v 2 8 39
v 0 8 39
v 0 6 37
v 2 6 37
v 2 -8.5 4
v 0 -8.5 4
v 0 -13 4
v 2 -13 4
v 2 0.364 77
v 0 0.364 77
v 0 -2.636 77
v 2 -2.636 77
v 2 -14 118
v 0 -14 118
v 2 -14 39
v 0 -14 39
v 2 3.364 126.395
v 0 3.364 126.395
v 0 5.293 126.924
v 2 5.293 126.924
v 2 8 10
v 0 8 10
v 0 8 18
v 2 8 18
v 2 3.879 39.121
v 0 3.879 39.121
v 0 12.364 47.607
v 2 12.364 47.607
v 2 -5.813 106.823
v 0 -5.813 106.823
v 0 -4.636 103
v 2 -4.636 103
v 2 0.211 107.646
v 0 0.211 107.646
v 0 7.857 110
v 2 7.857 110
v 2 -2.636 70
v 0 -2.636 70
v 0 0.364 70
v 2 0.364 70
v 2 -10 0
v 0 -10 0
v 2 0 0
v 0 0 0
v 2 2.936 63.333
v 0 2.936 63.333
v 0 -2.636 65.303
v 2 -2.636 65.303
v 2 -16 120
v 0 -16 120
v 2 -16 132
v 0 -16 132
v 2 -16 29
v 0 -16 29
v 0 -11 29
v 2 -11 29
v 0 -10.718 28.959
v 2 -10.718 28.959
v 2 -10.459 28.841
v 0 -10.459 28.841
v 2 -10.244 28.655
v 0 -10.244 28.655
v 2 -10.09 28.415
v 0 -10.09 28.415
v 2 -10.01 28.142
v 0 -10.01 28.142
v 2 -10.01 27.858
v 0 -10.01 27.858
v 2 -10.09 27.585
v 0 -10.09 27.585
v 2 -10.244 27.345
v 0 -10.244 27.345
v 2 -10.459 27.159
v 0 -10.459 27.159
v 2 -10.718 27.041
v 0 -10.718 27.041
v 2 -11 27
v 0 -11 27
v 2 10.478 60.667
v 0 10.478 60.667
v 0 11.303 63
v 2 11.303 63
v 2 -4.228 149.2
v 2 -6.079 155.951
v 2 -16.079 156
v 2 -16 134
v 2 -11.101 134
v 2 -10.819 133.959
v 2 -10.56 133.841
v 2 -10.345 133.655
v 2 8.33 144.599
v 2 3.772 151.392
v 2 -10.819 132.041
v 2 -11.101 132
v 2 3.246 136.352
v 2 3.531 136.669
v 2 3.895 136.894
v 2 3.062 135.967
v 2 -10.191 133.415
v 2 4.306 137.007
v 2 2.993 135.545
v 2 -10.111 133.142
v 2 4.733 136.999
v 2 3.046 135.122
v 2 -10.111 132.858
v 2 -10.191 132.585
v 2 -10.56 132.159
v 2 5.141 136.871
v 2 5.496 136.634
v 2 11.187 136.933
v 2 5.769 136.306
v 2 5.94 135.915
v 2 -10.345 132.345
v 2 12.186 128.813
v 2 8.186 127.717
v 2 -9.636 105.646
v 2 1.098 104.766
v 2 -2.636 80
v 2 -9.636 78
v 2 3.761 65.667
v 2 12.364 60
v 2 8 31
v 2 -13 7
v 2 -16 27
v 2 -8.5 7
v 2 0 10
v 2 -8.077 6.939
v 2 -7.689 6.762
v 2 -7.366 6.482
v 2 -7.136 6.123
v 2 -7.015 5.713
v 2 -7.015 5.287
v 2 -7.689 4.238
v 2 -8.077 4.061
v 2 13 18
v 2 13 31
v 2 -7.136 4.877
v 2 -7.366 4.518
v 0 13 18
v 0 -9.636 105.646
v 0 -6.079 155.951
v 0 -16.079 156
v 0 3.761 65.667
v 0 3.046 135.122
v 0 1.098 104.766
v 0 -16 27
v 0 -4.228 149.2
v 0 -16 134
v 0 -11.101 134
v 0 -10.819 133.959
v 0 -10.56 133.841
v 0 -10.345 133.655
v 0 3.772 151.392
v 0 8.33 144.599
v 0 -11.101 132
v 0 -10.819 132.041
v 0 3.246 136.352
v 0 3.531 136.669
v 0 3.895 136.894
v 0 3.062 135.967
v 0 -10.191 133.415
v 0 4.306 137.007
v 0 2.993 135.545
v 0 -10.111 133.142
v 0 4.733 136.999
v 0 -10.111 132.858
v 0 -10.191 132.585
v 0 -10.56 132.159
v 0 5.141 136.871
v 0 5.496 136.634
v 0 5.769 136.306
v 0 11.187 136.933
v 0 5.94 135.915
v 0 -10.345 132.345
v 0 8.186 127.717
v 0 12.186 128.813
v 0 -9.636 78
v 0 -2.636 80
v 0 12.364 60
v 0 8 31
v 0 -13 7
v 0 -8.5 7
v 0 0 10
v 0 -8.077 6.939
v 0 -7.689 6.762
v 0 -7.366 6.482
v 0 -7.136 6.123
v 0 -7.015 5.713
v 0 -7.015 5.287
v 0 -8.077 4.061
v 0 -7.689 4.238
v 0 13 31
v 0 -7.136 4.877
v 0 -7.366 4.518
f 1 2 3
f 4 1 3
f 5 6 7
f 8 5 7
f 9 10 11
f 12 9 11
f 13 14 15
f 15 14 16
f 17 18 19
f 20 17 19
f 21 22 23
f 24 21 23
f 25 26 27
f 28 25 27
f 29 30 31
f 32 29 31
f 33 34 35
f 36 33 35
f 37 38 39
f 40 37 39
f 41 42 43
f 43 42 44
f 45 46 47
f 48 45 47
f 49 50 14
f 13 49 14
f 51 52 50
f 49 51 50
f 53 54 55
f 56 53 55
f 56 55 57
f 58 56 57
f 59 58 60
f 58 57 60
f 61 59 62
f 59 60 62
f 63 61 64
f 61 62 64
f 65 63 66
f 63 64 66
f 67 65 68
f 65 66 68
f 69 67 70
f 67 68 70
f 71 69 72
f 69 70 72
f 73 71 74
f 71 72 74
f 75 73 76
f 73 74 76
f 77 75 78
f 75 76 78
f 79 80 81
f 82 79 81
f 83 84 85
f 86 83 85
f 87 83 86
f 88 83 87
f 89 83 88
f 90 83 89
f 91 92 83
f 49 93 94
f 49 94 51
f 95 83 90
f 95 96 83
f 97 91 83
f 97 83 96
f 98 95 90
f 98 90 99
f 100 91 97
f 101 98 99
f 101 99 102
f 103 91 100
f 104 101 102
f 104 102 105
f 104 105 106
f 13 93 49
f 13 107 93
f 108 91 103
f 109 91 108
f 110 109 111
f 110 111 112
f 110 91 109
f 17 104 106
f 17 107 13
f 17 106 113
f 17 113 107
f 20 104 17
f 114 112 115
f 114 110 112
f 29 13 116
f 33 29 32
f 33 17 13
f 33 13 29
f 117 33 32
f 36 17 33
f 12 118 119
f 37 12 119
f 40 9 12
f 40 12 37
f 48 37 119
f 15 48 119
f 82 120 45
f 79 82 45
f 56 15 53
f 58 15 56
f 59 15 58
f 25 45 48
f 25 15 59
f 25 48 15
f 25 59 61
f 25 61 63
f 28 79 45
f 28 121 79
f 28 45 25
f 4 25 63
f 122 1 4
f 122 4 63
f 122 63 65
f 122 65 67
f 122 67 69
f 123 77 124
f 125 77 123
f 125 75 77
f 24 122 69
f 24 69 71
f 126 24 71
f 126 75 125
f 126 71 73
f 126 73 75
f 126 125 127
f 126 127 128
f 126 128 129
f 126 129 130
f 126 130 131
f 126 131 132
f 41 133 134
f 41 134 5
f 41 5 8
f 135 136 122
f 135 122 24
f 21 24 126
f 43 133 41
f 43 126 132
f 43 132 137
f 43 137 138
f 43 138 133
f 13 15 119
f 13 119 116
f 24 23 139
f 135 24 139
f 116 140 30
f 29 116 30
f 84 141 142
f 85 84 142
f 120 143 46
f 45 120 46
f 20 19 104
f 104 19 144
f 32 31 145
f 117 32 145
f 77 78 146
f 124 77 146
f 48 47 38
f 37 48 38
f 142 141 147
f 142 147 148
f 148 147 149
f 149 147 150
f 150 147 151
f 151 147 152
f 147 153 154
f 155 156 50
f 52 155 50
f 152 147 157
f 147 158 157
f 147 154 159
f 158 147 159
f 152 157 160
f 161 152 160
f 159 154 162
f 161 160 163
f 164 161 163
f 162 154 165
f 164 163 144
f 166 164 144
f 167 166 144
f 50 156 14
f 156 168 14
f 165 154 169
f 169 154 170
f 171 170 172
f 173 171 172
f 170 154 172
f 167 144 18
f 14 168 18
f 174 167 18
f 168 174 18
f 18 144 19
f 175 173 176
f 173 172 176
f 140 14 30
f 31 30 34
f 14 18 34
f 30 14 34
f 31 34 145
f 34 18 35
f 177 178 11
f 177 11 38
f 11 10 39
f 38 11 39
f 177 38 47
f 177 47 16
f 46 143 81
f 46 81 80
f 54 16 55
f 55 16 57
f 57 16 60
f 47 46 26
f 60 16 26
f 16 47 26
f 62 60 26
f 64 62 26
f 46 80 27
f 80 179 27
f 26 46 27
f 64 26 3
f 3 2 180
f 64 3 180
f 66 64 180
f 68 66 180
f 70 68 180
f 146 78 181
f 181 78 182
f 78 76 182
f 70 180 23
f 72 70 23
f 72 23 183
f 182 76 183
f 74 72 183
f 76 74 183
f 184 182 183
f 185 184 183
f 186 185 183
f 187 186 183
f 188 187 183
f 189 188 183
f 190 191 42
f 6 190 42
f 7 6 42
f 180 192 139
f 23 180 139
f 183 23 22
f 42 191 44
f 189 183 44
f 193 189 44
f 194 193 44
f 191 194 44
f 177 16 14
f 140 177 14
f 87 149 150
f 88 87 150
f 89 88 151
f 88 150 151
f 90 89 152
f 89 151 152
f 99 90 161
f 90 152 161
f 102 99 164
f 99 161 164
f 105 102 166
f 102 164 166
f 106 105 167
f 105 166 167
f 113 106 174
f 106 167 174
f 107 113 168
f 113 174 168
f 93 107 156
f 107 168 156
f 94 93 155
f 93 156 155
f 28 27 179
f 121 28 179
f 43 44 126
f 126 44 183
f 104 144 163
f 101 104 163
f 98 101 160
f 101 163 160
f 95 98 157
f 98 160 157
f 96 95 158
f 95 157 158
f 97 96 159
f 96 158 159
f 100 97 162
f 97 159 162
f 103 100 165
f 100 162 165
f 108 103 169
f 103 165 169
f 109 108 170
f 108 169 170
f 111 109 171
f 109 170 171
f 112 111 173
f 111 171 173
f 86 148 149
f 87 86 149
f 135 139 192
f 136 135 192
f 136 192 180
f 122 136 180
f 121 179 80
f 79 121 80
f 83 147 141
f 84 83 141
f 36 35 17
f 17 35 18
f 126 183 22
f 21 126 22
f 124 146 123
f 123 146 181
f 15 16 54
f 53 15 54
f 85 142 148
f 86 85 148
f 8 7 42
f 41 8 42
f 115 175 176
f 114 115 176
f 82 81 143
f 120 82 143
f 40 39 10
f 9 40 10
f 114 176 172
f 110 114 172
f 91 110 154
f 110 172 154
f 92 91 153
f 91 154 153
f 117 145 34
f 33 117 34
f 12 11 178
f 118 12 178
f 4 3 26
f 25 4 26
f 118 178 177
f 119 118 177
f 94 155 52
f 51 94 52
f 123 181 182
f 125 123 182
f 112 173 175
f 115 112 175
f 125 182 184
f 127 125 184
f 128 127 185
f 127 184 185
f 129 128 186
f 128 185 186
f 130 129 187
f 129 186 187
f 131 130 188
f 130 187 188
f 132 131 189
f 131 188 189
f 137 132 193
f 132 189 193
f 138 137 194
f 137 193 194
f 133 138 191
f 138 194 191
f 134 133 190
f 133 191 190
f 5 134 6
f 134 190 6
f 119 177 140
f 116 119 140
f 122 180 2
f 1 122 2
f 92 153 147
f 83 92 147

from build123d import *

# Parameters (mm, degrees)
RESSALTO_EXTRUS_O1_DEPTH = 2


with BuildPart() as part:
    # Esboço1 → Ressalto-extrusão1 (new body)
    with BuildSketch(Plane(origin=(0, 0, 0), x_dir=(0, 0, -1), z_dir=(1, 0, 0))):
        with BuildLine():
            Line((0, 0), (-10, 0))
            Line((-10, 0), (-10, 8))
            Line((-10, 8), (-18, 8))
            Line((-18, 8), (-18, 13))
            Line((-18, 13), (-31, 13))
            Line((-31, 13), (-31, 8))
            Line((-31, 8), (-39, 8))
            Line((-39, 8), (-37, 6))
            Line((-37, 6), (-39.121320344, 3.878679656))
            Line((-39.121320344, 3.878679656), (-47.606601718, 12.363961031))
            Line((-47.606601718, 12.363961031), (-60, 12.363961031))
            Line((-60, 12.363961031), (-60.666666667, 10.478342948))
            Line((-60.666666667, 10.478342948), (-63, 11.303300859))
            Line((-63, 11.303300859), (-65.666666667, 3.760828526))
            Line((-65.666666667, 3.760828526), (-63.333333333, 2.935870615))
            Line((-63.333333333, 2.935870615), (-65.303300859, -2.636038969))
            Line((-65.303300859, -2.636038969), (-70, -2.636038969))
            Line((-70, -2.636038969), (-70, 0.363961031))
            Line((-70, 0.363961031), (-77, 0.363961031))
            Line((-77, 0.363961031), (-77, -2.636038969))
            Line((-77, -2.636038969), (-80, -2.636038969))
            Line((-80, -2.636038969), (-78, -9.636038969))
            Line((-78, -9.636038969), (-105.645751311, -9.636038969))
            Line((-105.645751311, -9.636038969), (-106.822875656, -5.813163314))
            Line((-106.822875656, -5.813163314), (-103, -4.636038969))
            Line((-103, -4.636038969), (-104.765686517, 1.098274514))
            Line((-104.765686517, 1.098274514), (-107.645751311, 0.21145666))
            Line((-107.645751311, 0.21145666), (-110, 7.857207972))
            Line((-110, 7.857207972), (-126.395448513, 3.363961031))
            Line((-126.395448513, 3.363961031), (-126.9240658, 5.292837326))
            Line((-126.9240658, 5.292837326), (-135.121790056, 3.046213856))
            ThreePointArc((-135.121790056, 3.046213856), (-136.964910243, 4.096408112), (-135.914715987, 5.939528299))
            Line((-135.914715987, 5.939528299), (-127.71699173, 8.18615177))
            Line((-127.71699173, 8.18615177), (-128.813209852, 12.18615177))
            ThreePointArc((-128.813209852, 12.18615177), (-140.849618713, 9.983199212), (-151.392124565, 3.771620619))
            Line((-151.392124565, 3.771620619), (-149.199688323, -4.228379381))
            Line((-149.199688323, -4.228379381), (-155.950755357, -6.078539886))
            Line((-155.950755357, -6.078539886), (-156, -16.078539886))
            Line((-156, -16.078539886), (-134, -16))
            Line((-134, -16), (-134, -11.101020514))
            ThreePointArc((-134, -11.101020514), (-133, -10.101020514), (-132, -11.101020514))
            Line((-132, -11.101020514), (-132, -16))
            Line((-132, -16), (-120, -16))
            Line((-120, -16), (-118, -14))
            Line((-118, -14), (-39, -14))
            Line((-39, -14), (-29, -16))
            Line((-29, -16), (-29, -11))
            ThreePointArc((-29, -11), (-28, -10), (-27, -11))
            Line((-27, -11), (-27, -16))
            Line((-27, -16), (-7, -13))
            Line((-7, -13), (-7, -8.5))
            ThreePointArc((-7, -8.5), (-5.5, -7), (-4, -8.5))
            Line((-4, -8.5), (-4, -13))
            Line((-4, -13), (0, -10))
            Line((0, -10), (0, 0))
        make_face()
    extrude(amount=RESSALTO_EXTRUS_O1_DEPTH)


solid = part.part
